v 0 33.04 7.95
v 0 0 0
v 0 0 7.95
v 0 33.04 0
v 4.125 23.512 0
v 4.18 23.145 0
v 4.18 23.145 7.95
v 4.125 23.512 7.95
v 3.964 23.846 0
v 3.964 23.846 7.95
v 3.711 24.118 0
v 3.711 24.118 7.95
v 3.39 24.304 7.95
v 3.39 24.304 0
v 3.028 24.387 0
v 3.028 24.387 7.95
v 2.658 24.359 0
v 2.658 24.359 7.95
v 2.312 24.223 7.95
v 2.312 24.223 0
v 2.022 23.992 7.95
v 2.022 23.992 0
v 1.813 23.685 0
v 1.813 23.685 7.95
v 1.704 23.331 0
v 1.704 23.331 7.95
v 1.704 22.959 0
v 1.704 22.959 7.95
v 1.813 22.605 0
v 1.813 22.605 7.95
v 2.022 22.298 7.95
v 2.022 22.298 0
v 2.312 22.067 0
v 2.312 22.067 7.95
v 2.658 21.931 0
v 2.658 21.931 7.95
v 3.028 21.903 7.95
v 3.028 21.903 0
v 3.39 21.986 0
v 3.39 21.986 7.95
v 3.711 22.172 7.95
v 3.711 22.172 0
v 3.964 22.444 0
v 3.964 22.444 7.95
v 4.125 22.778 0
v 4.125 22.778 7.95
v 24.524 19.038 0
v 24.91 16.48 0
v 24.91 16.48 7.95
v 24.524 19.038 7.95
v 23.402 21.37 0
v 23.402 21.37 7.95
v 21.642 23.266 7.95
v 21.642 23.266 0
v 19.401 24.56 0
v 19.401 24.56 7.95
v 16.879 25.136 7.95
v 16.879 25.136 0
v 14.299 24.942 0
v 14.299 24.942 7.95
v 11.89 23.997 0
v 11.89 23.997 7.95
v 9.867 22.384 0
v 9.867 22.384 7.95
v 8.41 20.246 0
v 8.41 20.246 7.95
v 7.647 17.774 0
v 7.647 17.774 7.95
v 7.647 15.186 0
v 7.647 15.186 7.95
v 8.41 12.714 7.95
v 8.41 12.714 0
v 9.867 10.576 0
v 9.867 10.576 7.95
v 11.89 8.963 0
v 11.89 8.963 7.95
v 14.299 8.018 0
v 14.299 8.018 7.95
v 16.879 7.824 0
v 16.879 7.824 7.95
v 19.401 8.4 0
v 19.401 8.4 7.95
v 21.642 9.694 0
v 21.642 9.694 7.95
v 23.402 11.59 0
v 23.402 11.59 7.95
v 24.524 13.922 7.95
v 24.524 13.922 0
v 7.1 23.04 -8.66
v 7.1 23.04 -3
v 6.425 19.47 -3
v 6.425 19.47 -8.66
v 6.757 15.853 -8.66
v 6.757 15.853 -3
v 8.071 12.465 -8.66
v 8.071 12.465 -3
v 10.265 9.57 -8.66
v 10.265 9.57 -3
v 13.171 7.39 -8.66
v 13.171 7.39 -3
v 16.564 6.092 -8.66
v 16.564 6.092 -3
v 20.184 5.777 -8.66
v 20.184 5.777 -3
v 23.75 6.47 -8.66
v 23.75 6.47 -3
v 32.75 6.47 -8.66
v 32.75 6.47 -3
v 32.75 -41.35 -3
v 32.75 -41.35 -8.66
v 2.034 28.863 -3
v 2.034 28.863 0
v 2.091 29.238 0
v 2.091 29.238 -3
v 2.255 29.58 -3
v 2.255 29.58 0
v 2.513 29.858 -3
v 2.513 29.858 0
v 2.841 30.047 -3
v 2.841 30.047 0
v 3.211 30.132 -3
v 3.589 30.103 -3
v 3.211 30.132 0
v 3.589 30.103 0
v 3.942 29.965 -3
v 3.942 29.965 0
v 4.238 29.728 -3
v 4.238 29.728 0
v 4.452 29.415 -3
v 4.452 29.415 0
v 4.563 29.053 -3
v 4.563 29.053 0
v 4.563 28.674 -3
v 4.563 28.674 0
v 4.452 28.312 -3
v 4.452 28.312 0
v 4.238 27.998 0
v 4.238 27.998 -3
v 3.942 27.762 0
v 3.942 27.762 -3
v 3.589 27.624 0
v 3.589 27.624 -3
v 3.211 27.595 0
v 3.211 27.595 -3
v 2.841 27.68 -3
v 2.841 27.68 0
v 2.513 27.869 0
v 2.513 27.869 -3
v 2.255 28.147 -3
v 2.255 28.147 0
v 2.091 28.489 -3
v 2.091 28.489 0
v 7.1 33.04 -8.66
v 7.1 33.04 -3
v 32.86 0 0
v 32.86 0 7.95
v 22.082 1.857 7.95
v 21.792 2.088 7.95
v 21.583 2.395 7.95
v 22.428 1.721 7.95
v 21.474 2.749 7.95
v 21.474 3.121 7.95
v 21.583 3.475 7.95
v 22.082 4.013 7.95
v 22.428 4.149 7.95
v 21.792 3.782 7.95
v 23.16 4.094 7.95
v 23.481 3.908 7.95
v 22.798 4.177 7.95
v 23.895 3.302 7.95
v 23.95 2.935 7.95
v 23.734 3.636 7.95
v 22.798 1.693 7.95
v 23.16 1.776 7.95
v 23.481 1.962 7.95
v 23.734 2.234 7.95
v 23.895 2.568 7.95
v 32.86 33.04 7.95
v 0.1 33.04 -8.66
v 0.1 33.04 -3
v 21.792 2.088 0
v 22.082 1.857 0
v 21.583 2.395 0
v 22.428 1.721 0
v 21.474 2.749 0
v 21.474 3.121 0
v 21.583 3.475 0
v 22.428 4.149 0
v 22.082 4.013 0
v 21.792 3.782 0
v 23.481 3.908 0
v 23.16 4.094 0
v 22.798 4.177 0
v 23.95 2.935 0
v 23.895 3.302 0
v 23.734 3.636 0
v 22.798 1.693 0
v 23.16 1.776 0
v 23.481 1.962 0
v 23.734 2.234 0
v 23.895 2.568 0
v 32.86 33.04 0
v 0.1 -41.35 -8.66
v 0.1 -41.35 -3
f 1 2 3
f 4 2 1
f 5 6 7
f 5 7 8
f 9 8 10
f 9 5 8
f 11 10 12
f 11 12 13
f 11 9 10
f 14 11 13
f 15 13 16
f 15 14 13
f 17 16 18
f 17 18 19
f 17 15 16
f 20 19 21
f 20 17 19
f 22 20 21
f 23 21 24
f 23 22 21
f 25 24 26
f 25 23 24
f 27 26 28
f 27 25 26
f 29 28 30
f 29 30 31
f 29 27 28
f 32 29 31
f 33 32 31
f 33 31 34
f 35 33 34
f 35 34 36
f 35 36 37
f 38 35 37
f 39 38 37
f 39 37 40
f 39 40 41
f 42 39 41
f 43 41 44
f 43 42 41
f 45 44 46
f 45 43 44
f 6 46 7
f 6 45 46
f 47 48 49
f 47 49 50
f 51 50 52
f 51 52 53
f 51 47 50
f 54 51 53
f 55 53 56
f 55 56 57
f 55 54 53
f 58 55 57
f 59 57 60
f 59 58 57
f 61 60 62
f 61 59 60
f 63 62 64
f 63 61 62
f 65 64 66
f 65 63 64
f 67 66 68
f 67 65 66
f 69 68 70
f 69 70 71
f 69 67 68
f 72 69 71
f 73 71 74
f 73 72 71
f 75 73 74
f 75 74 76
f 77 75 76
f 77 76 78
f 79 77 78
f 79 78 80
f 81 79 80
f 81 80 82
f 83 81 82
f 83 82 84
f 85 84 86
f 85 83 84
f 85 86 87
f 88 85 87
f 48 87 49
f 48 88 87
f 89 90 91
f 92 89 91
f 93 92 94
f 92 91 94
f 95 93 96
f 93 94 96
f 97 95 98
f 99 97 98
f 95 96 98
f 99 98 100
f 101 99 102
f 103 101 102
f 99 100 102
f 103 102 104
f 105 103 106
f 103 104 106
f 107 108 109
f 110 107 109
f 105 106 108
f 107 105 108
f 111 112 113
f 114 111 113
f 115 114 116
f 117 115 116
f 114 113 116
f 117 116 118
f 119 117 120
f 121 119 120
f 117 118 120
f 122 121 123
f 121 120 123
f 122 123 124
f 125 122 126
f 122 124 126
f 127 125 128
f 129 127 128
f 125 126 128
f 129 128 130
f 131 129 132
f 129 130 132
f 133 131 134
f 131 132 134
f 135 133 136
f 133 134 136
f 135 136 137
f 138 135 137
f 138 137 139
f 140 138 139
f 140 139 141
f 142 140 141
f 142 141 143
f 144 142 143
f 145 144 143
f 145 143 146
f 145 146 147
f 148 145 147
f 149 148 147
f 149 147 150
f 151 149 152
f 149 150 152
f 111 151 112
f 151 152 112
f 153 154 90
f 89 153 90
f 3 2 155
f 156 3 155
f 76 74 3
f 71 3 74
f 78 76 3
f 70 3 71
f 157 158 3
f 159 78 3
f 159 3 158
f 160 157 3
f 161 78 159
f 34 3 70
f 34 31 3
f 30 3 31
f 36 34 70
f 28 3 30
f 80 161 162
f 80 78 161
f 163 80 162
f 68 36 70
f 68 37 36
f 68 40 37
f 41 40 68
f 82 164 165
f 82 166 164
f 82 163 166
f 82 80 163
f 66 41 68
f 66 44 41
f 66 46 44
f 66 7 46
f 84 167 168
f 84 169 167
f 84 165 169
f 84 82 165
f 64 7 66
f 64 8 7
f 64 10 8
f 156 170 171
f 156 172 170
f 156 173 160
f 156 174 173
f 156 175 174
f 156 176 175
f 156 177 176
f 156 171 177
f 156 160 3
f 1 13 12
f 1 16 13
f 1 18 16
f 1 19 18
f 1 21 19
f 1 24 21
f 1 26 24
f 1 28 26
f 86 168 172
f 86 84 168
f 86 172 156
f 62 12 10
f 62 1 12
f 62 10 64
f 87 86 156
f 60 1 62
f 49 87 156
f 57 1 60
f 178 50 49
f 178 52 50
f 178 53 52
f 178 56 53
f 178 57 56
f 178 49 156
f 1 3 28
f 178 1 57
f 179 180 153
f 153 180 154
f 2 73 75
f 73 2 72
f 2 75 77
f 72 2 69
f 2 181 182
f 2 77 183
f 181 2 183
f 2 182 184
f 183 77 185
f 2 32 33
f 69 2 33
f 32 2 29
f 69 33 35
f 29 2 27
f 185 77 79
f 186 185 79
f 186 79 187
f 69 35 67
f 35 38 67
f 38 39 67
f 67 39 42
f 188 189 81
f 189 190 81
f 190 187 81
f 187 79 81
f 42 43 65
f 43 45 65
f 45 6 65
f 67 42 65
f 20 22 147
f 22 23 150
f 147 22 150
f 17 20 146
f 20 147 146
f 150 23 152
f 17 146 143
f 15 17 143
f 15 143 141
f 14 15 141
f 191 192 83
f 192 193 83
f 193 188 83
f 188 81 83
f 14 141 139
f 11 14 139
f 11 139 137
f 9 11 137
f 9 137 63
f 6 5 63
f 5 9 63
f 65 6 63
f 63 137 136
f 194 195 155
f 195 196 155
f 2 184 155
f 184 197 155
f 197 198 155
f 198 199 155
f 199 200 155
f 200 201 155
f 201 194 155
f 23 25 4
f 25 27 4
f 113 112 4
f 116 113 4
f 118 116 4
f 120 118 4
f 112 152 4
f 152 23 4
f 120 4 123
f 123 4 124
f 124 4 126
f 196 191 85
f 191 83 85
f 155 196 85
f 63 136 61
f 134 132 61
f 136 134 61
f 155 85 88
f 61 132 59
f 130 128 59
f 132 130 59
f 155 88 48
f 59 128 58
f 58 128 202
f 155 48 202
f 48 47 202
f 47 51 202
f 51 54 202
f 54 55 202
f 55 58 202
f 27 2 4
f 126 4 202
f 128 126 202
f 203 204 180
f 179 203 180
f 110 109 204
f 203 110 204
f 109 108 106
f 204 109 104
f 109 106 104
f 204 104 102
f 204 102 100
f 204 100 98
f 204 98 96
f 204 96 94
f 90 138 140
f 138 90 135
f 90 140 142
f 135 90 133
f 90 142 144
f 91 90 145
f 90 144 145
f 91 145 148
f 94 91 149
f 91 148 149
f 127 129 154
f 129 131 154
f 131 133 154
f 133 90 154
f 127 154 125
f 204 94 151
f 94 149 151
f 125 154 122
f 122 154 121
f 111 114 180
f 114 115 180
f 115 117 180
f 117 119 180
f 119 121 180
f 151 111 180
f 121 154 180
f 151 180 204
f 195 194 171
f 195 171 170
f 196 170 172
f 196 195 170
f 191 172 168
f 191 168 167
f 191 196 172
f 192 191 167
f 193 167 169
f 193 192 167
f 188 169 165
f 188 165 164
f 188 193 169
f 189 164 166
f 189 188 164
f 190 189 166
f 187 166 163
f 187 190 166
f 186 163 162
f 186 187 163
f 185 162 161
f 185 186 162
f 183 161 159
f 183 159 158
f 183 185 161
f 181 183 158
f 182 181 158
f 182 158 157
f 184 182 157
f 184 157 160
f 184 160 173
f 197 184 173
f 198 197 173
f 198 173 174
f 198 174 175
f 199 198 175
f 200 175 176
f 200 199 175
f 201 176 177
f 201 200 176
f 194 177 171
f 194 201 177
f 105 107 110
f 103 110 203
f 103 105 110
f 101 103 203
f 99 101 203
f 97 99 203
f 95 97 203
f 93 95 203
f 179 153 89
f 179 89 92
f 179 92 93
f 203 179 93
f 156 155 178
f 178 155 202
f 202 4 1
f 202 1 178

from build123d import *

# Parameters (mm, degrees)
SKETCH1_W           = 32.86
SKETCH1_H           = 33.04
SKETCH1_R           = 8.68
SKETCH1_R_2         = 1.245
BOSS_EXTRUDE1_DEPTH = 7.95
SKETCH2_R           = 1.271766889
BOSS_EXTRUDE2_DEPTH = 3
BOSS_EXTRUDE3_DEPTH = 5.66


with BuildPart() as part:
    # Sketch1 → Boss-Extrude1 (new body)
    with BuildSketch(Plane.XY):
        with Locations((16.43, 16.52)):
            Rectangle(SKETCH1_W, SKETCH1_H)
        with Locations((16.23, 16.48)):
            Circle(SKETCH1_R, mode=Mode.SUBTRACT)
        with Locations((2.935, 23.145)):
            Circle(SKETCH1_R_2, mode=Mode.SUBTRACT)
        with Locations((22.705, 2.935)):
            Circle(SKETCH1_R_2, mode=Mode.SUBTRACT)
    extrude(amount=BOSS_EXTRUDE1_DEPTH)

    # Sketch2 → Boss-Extrude2 (add)
    with BuildSketch(Plane(origin=(0, 0, 0), x_dir=(-1, 0, 0), z_dir=(0, 0, -1))):
        with Locations((-3.305838701, 28.863410922)):
            Circle(SKETCH2_R)
    extrude(amount=BOSS_EXTRUDE2_DEPTH)

    # Sketch3 → Boss-Extrude3 (add)
    with BuildSketch(Plane(origin=(0, 0, -3), x_dir=(-1, 0, 0), z_dir=(0, 0, -1))):
        with BuildLine():
            Line((-0.1, 33.04), (-7.1, 33.04))
            Line((-7.1, 33.04), (-7.1, 23.04))
            ThreePointArc((-7.1, 23.04), (-10.265055125, 9.570142898), (-23.75, 6.47))
            Line((-23.75, 6.47), (-32.75, 6.47))
            Line((-32.75, 6.47), (-32.75, -41.35))
            Line((-32.75, -41.35), (-0.1, -41.35))
            Line((-0.1, -41.35), (-0.1, 33.04))
        make_face()
    extrude(amount=BOSS_EXTRUDE3_DEPTH)


solid = part.part
